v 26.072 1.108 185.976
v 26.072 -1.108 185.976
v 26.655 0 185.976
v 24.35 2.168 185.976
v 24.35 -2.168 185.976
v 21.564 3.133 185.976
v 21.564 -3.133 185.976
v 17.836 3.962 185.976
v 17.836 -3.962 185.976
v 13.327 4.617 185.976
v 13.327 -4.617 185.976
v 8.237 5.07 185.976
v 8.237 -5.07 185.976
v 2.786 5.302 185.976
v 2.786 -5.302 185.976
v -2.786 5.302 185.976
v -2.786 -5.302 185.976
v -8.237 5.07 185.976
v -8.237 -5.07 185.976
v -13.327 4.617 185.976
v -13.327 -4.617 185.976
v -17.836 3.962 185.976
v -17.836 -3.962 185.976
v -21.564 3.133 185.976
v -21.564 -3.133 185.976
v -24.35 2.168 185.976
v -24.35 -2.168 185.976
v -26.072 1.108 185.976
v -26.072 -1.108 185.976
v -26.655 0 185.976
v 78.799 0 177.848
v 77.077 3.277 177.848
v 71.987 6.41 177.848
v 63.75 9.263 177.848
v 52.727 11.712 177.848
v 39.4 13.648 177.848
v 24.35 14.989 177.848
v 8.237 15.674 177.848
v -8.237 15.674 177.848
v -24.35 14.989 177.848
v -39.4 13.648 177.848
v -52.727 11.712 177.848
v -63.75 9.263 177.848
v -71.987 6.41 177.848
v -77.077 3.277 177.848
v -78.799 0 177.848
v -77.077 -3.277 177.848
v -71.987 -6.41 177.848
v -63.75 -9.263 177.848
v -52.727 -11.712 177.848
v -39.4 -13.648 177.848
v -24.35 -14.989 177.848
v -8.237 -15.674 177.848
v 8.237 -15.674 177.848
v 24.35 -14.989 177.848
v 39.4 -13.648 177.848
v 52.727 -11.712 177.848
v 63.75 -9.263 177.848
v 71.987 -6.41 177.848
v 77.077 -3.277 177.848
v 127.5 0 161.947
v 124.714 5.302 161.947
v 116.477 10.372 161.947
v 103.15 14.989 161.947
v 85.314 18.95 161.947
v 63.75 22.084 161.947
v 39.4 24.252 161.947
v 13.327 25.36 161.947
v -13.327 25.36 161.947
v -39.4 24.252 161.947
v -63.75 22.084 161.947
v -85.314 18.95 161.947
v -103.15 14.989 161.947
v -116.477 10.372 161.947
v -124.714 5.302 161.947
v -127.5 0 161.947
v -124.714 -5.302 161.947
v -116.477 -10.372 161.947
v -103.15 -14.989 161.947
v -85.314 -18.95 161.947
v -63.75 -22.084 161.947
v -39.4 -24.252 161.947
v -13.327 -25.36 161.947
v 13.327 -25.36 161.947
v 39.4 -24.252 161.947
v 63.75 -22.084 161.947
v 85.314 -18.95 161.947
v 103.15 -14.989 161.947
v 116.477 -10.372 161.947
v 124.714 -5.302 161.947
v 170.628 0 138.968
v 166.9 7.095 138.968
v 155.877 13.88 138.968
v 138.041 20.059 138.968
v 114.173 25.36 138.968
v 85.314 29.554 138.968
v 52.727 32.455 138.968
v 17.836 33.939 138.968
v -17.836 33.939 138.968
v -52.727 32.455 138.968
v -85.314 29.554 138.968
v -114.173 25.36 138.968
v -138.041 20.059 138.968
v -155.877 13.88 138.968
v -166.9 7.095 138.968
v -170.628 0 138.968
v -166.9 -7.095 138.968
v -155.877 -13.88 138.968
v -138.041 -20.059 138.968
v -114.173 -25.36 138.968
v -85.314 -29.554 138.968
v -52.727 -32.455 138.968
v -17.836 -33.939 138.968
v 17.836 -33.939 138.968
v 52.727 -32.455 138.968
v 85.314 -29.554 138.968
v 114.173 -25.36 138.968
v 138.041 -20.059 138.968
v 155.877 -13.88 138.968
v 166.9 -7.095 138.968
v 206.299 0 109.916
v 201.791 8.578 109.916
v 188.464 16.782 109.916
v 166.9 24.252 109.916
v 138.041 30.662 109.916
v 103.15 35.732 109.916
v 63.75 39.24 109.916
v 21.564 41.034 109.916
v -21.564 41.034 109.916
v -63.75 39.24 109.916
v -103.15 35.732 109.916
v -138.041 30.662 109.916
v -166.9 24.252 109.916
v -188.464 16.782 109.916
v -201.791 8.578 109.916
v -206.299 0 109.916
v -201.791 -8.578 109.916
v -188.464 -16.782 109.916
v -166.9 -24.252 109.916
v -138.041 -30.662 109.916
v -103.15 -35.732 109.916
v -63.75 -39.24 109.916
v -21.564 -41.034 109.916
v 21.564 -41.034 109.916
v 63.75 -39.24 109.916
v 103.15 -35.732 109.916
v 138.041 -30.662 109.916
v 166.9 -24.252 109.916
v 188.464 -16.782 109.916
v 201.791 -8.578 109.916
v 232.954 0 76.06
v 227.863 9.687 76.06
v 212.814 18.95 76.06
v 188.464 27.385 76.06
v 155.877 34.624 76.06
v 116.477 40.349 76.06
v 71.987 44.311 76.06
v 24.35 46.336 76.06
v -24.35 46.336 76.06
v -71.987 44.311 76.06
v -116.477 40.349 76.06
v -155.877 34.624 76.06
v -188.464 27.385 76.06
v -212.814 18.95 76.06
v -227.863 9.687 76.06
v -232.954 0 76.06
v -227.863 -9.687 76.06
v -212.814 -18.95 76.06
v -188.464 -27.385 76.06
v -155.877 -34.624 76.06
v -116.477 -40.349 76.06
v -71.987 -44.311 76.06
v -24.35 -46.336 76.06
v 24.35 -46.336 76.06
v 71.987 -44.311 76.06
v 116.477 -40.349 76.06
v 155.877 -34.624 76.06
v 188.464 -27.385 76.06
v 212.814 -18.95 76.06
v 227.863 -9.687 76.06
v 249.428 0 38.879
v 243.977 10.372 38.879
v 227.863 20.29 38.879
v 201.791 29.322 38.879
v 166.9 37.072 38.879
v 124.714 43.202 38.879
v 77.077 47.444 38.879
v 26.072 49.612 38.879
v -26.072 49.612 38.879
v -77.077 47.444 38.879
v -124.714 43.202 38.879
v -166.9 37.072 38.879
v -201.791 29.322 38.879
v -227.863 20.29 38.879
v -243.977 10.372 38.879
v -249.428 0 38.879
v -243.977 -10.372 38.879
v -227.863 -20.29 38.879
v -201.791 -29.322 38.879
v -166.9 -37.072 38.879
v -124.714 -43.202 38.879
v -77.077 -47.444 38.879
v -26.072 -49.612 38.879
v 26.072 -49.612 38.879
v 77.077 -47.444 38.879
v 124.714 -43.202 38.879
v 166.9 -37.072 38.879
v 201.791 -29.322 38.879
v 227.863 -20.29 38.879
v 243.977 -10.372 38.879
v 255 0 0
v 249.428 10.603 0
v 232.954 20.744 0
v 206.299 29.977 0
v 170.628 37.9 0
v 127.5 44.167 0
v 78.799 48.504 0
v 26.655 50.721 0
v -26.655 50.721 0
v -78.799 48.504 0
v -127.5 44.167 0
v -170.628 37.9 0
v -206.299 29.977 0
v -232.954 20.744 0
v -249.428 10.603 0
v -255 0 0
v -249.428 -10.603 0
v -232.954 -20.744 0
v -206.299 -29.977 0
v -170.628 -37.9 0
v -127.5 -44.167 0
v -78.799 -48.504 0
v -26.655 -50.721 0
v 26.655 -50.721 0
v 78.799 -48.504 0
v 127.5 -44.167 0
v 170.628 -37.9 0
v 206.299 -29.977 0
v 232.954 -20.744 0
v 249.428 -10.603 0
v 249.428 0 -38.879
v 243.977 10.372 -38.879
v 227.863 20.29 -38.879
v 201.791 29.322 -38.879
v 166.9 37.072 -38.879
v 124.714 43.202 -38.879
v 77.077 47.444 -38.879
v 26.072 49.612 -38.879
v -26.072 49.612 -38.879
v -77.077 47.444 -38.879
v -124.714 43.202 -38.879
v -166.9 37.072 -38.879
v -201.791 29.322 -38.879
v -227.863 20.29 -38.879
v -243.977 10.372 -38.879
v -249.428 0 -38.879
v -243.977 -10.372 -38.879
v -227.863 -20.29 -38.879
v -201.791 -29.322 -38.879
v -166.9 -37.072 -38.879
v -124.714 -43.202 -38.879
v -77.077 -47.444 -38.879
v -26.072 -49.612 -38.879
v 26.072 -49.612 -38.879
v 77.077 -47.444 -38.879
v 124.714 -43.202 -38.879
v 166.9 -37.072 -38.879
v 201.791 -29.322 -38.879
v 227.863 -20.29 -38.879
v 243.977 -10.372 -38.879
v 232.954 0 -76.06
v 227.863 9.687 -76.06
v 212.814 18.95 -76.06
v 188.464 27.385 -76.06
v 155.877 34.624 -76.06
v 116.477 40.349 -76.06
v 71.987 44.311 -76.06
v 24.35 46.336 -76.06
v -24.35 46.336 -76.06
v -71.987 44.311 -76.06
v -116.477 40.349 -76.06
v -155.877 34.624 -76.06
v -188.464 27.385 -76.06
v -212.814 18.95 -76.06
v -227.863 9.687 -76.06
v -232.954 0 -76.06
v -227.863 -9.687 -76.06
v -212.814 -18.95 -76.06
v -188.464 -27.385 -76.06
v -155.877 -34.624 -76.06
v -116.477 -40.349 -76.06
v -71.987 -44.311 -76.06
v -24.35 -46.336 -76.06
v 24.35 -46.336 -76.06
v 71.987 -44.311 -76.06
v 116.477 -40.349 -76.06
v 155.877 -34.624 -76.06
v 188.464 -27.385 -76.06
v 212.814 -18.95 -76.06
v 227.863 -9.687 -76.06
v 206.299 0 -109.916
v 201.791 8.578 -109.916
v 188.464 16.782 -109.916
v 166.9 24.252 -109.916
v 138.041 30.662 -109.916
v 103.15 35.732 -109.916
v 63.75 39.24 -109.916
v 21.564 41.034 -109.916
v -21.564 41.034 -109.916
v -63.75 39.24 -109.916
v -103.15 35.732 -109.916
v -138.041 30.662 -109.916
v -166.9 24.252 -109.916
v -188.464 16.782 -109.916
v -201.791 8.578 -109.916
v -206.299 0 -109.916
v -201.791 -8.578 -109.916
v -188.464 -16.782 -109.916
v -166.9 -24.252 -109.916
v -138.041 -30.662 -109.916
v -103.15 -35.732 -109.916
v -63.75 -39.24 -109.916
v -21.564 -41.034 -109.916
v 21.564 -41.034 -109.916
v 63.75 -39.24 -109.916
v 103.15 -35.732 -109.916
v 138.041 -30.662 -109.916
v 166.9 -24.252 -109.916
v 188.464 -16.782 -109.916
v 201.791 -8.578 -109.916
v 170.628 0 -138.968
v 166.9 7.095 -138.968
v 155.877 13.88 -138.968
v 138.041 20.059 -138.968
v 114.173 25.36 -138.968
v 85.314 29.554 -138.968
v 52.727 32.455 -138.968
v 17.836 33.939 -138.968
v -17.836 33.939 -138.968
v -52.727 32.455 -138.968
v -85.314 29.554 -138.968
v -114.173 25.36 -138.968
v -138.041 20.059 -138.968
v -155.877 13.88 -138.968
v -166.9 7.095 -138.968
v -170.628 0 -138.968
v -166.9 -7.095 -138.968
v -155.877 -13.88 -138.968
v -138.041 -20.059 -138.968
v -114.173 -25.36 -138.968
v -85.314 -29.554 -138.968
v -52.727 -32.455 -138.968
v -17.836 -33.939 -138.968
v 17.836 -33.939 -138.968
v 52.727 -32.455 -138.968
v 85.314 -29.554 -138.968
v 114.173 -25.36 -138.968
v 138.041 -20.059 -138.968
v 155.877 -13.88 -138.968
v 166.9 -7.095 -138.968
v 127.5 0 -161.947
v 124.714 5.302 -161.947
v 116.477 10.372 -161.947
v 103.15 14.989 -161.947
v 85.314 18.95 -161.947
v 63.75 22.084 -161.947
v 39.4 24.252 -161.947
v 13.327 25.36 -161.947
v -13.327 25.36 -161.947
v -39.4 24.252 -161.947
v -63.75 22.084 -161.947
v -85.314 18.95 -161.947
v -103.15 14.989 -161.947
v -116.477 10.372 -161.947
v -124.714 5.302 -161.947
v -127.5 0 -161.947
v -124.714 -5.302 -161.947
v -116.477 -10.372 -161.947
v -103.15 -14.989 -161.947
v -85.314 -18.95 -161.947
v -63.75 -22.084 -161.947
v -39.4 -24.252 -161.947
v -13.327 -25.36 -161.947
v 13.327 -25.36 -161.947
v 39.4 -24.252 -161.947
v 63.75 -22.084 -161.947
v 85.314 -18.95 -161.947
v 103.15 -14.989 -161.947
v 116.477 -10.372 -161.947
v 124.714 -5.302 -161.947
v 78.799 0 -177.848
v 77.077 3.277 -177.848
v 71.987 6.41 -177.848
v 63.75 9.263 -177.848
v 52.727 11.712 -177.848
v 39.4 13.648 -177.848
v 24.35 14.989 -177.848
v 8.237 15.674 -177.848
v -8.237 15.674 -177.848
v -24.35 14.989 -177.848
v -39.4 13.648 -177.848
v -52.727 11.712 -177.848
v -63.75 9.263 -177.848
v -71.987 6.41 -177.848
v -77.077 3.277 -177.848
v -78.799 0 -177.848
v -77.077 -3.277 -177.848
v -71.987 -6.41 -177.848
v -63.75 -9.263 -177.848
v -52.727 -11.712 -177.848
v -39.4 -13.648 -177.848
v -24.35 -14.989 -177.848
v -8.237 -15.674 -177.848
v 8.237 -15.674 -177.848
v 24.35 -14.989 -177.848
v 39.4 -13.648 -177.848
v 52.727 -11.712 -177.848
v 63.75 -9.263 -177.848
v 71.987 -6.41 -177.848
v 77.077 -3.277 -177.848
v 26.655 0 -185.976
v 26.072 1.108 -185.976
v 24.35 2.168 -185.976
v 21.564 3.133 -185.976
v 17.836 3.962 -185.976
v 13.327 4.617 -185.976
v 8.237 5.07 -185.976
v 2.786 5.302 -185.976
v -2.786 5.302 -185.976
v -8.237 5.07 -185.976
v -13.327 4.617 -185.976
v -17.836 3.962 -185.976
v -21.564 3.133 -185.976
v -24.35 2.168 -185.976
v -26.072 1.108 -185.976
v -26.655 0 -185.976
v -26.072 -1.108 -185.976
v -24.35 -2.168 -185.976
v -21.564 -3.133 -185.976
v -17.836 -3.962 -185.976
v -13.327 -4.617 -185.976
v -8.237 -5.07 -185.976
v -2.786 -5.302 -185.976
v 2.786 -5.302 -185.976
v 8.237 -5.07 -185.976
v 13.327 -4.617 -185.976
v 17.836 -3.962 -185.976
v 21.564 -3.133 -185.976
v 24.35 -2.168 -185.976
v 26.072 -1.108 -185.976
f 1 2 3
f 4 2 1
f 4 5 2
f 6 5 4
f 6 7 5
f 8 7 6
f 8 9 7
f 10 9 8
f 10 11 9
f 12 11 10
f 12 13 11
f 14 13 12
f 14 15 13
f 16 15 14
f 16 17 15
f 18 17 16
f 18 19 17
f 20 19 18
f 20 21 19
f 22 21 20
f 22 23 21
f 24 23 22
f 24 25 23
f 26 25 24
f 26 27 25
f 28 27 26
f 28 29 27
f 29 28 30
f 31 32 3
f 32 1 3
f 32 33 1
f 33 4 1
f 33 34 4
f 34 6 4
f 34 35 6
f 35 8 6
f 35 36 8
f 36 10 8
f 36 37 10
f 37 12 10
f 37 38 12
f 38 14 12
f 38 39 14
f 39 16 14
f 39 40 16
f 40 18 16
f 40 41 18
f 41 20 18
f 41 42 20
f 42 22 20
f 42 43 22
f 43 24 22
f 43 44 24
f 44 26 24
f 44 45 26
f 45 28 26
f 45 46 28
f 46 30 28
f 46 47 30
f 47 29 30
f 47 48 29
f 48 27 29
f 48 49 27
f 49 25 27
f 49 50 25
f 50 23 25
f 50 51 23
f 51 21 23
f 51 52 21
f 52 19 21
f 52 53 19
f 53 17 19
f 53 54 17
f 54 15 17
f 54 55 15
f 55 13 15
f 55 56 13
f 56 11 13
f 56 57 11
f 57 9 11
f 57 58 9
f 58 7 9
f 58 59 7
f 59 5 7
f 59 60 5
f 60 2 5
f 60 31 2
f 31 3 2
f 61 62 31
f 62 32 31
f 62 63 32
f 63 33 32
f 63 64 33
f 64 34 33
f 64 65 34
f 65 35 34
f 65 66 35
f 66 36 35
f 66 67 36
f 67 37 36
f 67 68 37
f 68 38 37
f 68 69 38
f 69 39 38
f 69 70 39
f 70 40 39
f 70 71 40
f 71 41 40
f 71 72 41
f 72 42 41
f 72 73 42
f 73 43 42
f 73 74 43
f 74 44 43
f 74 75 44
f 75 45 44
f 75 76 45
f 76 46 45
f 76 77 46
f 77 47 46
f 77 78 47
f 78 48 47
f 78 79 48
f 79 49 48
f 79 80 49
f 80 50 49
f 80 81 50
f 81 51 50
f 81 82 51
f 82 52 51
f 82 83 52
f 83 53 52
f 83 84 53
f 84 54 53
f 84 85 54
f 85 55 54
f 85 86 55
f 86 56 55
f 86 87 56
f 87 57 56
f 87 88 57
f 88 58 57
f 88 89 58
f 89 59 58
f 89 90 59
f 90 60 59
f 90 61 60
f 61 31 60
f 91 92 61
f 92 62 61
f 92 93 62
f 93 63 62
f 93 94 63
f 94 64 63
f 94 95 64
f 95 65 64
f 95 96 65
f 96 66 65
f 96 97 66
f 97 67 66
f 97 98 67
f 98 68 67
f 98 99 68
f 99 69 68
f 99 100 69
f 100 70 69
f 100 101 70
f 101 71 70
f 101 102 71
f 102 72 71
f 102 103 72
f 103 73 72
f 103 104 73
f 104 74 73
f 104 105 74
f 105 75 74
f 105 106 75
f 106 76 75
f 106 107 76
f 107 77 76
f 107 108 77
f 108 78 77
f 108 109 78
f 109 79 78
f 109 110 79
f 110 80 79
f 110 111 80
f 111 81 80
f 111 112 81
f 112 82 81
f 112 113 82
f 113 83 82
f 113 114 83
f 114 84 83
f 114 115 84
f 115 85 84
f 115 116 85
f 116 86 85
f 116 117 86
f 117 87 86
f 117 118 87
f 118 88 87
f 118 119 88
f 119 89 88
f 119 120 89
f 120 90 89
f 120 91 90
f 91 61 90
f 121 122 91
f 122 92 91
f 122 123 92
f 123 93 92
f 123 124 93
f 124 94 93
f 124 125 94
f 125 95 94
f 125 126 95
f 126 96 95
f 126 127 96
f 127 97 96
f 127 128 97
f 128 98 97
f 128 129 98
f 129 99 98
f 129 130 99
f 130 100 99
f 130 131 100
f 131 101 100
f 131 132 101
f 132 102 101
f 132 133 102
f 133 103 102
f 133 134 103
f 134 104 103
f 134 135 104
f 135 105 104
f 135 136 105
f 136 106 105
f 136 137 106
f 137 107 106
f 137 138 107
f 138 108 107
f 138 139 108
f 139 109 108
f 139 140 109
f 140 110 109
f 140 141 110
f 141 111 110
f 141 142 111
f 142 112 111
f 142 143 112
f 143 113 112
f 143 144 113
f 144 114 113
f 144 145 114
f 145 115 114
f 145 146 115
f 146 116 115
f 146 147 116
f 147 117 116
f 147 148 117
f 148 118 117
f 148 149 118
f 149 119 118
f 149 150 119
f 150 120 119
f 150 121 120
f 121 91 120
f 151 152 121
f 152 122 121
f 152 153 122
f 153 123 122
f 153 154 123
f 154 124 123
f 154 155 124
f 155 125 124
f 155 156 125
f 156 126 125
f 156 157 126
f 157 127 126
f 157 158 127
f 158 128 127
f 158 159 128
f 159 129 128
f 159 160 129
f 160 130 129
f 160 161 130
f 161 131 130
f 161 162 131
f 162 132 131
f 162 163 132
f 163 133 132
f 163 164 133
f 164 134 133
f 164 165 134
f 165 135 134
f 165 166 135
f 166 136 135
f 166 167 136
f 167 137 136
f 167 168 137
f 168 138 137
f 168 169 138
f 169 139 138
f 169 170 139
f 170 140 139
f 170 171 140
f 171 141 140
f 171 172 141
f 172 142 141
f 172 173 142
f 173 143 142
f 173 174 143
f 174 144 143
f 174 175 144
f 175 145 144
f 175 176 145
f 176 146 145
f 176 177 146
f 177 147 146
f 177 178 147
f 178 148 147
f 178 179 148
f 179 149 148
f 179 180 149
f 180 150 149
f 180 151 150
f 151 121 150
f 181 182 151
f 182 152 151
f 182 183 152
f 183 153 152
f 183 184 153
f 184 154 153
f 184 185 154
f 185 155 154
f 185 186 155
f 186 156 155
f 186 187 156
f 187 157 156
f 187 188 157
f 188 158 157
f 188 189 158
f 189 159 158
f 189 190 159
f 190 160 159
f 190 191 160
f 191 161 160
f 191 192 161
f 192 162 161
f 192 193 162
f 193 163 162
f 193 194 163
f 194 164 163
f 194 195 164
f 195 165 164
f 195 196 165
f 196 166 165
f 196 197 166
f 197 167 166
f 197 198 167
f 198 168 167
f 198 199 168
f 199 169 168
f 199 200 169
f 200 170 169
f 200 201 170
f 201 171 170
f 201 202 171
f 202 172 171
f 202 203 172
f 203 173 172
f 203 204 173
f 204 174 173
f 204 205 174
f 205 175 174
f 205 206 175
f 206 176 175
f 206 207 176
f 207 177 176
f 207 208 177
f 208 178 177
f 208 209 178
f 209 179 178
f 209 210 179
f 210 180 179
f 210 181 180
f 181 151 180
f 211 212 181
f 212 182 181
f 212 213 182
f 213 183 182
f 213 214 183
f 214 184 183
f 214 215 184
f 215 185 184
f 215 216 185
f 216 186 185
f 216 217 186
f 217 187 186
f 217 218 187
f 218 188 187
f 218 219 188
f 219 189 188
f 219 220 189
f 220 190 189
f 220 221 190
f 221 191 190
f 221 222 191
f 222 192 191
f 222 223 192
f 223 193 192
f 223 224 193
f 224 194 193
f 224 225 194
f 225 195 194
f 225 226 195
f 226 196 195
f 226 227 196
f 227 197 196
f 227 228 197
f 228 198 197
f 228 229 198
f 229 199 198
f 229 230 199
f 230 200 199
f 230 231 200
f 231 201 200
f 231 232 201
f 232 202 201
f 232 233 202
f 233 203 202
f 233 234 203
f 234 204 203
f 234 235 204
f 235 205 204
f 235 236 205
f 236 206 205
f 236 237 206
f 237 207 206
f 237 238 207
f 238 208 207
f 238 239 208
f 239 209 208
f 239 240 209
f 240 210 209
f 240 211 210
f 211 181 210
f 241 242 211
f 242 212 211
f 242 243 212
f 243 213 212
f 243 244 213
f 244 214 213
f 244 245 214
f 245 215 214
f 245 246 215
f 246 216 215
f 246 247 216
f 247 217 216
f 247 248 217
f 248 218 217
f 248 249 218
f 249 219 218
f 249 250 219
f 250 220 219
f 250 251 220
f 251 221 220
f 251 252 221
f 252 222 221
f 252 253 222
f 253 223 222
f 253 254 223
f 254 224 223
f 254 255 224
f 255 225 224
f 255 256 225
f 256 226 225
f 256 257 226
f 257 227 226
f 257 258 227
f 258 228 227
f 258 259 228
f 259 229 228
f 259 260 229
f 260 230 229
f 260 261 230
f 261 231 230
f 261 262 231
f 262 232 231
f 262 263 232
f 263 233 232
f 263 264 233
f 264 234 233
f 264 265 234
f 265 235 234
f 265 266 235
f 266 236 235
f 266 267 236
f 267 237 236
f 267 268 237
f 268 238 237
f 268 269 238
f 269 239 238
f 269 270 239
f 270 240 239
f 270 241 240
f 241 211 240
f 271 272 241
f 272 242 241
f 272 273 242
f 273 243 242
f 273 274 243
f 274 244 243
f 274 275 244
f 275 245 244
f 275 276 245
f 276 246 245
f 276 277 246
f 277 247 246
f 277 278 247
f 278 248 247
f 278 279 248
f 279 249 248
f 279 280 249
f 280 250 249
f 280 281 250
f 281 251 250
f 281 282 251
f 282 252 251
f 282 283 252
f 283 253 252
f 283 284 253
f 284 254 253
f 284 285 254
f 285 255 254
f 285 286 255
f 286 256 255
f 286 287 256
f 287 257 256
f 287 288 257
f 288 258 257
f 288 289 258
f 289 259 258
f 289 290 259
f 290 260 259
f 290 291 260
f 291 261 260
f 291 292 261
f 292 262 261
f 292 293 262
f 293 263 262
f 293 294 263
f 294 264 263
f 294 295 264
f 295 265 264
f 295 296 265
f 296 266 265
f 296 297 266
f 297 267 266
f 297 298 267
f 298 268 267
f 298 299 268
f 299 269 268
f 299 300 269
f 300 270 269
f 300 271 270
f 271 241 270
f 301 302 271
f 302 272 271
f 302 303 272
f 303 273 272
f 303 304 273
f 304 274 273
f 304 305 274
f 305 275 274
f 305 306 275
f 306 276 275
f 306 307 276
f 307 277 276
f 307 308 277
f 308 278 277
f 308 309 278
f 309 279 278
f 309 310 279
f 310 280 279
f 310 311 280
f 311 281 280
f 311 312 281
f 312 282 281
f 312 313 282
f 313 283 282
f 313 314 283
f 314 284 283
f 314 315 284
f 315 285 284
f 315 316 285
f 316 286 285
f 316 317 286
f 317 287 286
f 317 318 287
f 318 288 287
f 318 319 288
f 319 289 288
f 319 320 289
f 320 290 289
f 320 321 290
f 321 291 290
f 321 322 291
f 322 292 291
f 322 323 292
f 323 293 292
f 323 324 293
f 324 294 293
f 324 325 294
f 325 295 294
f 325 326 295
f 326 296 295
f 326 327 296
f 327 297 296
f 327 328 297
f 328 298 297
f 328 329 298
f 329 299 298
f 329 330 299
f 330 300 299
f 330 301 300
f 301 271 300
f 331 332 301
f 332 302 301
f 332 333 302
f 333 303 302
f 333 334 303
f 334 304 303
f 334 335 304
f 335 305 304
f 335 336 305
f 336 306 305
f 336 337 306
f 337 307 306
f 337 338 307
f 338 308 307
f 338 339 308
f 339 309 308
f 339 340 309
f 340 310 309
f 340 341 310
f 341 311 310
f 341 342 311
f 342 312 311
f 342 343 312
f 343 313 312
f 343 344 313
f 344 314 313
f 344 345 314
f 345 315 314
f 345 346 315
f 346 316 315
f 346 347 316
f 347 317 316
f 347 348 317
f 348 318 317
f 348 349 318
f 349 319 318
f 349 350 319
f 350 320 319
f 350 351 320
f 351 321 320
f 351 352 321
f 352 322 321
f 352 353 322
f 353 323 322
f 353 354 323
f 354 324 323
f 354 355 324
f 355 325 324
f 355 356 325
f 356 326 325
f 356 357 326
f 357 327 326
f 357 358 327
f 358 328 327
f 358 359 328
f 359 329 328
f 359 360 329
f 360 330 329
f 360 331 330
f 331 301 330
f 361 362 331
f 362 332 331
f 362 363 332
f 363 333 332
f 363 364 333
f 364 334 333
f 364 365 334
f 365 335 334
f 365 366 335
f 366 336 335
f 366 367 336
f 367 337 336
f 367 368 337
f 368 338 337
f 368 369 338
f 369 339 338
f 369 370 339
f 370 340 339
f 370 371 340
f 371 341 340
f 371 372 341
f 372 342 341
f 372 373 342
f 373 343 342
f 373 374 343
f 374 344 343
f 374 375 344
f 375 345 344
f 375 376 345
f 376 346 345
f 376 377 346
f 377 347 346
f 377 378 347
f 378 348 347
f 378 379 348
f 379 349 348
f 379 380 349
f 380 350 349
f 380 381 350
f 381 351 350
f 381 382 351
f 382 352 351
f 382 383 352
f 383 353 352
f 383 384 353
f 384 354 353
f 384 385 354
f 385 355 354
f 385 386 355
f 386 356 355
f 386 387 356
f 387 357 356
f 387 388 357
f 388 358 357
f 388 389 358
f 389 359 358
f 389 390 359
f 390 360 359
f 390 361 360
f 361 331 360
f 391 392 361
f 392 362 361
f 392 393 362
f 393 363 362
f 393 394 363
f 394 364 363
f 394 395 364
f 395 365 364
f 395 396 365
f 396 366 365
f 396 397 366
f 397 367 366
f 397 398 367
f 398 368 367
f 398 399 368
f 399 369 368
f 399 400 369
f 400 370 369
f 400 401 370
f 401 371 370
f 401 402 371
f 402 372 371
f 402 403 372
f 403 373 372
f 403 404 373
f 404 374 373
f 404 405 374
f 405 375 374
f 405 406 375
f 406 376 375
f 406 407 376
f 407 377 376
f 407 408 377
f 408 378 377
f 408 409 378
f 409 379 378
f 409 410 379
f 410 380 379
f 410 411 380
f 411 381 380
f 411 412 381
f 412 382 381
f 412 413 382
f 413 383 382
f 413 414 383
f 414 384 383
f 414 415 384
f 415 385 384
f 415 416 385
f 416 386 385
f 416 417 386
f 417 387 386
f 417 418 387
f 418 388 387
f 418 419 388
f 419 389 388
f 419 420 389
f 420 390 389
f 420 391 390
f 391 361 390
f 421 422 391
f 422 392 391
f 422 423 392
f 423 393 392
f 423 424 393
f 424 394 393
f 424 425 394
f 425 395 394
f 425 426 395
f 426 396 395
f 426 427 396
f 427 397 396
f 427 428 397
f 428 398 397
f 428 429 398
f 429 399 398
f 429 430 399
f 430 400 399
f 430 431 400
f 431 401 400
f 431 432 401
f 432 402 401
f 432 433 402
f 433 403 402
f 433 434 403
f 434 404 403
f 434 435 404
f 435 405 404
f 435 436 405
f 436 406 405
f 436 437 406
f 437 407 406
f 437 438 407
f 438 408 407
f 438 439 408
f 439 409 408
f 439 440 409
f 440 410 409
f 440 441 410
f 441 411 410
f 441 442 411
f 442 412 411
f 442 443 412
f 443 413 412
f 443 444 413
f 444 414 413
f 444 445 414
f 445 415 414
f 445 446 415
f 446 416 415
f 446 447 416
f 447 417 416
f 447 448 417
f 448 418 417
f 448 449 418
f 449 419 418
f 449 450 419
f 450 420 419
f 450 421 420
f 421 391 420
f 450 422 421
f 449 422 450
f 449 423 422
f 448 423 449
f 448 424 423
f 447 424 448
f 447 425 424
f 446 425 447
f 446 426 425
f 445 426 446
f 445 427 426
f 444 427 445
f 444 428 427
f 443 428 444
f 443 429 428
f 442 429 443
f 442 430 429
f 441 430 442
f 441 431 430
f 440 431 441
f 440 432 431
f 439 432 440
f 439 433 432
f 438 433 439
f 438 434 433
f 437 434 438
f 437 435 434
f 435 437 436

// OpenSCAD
// Generated by SolidPython 1.0.1 on 2020-07-29 00:46:51


scale(v = [15, 3, 11]) {
	sphere(r = 17);
}
/***********************************************
*********      SolidPython code:      **********
************************************************
 
# import packages: SolidPython
from solid import *
from solid.utils import *
from itertools import chain, combinations, permutations


class Resize:

    def __init__(self, scad_file):
        self.scad_file = scad_file
        #self.scad_file = import_scad(scad_file)
        # cone/cylinder param:
        self.r1 = 0
        self.r2 = 0
        self.h = 0
        # rectangular prism param:
        self.w = 0
        self.l = 0
        # ellipse param:
        self.r = 0

    # import OpenScad code (file name corresponds to shape)


    # classify shape + parameters
    def assign(self, param1, param2, param3):
        if self.scad_file == 'cone.scad':
            self.r1 = param1
            self.r2 = param2
            self.h = param3
        elif self.scad_file == 'cylinder.scad':
            self.r1 = param1
            self.r2 = param2
            self.h = param3
        elif self.scad_file == 'rectangularPrism.scad':
            self.h = param1
            self.l = param2
            self.w = param3
        else:
            self.r = param1
            self.h = param2

    # resize parameters
    def iterate(self):
        x = range(3, 20, 2)
        i = 1
        if self.scad_file == 'cone.scad':
            tempList = list(permutations(x, 2))
            for temp in tempList:
                param1 = temp[0]
                param2 = temp[1]
                filepath = 'produced_scad_files/' + 'cone' + str(param1) + '_' + str(param2) + '_' + '.scad'
                scad_render_to_file(cylinder(h=param1, r1=param2, r2=0), filepath)

        elif self.scad_file == 'cylinder.scad':
            tempList = list(permutations(x, 3))
            for temp in tempList:
                param1 = temp[0]
                param2 = temp[1]
                filepath = 'produced_scad_files/' + 'cylinder' + str(param1) + '_' + str(param2) + '_' + '.scad'
                scad_render_to_file(cylinder(h=param1, r1=param2, r2=param2), filepath)

        elif self.scad_file == 'rectangularPrism.scad':
            tempList = list(permutations(x, 3))
            for temp in tempList:
                param1 = temp[0]
                param2 = temp[1]
                param3 = temp[2]
                filepath = 'produced_scad_files/' + 'rectangularPrism' + str(param1) + '_' + str(param2) + '_' + str(
                    param3) + '.scad'
                scad_render_to_file(cube(size=(param1, param2, param3)), filepath)

        elif self.scad_file == 'ellipse.scad':
            tempList = list(permutations(x, 4))
            for temp in tempList:
                param1 = temp[0]
                param2 = temp[1]
                param3 = temp[2]
                param4 = temp[3]
                filepath = 'produced_scad_files/' + 'ellipse' + str(param1) + '_' + str(param2) + '_' + str(param3) + '_' + str(param4) + '.scad'
                scad_render_to_file(scale([param1, param2, param3])(sphere(r=param4)), filepath)

    def render_to_scadfile(self):
        scad_render_to_file(scad, 'example.scad') 
 
************************************************/
